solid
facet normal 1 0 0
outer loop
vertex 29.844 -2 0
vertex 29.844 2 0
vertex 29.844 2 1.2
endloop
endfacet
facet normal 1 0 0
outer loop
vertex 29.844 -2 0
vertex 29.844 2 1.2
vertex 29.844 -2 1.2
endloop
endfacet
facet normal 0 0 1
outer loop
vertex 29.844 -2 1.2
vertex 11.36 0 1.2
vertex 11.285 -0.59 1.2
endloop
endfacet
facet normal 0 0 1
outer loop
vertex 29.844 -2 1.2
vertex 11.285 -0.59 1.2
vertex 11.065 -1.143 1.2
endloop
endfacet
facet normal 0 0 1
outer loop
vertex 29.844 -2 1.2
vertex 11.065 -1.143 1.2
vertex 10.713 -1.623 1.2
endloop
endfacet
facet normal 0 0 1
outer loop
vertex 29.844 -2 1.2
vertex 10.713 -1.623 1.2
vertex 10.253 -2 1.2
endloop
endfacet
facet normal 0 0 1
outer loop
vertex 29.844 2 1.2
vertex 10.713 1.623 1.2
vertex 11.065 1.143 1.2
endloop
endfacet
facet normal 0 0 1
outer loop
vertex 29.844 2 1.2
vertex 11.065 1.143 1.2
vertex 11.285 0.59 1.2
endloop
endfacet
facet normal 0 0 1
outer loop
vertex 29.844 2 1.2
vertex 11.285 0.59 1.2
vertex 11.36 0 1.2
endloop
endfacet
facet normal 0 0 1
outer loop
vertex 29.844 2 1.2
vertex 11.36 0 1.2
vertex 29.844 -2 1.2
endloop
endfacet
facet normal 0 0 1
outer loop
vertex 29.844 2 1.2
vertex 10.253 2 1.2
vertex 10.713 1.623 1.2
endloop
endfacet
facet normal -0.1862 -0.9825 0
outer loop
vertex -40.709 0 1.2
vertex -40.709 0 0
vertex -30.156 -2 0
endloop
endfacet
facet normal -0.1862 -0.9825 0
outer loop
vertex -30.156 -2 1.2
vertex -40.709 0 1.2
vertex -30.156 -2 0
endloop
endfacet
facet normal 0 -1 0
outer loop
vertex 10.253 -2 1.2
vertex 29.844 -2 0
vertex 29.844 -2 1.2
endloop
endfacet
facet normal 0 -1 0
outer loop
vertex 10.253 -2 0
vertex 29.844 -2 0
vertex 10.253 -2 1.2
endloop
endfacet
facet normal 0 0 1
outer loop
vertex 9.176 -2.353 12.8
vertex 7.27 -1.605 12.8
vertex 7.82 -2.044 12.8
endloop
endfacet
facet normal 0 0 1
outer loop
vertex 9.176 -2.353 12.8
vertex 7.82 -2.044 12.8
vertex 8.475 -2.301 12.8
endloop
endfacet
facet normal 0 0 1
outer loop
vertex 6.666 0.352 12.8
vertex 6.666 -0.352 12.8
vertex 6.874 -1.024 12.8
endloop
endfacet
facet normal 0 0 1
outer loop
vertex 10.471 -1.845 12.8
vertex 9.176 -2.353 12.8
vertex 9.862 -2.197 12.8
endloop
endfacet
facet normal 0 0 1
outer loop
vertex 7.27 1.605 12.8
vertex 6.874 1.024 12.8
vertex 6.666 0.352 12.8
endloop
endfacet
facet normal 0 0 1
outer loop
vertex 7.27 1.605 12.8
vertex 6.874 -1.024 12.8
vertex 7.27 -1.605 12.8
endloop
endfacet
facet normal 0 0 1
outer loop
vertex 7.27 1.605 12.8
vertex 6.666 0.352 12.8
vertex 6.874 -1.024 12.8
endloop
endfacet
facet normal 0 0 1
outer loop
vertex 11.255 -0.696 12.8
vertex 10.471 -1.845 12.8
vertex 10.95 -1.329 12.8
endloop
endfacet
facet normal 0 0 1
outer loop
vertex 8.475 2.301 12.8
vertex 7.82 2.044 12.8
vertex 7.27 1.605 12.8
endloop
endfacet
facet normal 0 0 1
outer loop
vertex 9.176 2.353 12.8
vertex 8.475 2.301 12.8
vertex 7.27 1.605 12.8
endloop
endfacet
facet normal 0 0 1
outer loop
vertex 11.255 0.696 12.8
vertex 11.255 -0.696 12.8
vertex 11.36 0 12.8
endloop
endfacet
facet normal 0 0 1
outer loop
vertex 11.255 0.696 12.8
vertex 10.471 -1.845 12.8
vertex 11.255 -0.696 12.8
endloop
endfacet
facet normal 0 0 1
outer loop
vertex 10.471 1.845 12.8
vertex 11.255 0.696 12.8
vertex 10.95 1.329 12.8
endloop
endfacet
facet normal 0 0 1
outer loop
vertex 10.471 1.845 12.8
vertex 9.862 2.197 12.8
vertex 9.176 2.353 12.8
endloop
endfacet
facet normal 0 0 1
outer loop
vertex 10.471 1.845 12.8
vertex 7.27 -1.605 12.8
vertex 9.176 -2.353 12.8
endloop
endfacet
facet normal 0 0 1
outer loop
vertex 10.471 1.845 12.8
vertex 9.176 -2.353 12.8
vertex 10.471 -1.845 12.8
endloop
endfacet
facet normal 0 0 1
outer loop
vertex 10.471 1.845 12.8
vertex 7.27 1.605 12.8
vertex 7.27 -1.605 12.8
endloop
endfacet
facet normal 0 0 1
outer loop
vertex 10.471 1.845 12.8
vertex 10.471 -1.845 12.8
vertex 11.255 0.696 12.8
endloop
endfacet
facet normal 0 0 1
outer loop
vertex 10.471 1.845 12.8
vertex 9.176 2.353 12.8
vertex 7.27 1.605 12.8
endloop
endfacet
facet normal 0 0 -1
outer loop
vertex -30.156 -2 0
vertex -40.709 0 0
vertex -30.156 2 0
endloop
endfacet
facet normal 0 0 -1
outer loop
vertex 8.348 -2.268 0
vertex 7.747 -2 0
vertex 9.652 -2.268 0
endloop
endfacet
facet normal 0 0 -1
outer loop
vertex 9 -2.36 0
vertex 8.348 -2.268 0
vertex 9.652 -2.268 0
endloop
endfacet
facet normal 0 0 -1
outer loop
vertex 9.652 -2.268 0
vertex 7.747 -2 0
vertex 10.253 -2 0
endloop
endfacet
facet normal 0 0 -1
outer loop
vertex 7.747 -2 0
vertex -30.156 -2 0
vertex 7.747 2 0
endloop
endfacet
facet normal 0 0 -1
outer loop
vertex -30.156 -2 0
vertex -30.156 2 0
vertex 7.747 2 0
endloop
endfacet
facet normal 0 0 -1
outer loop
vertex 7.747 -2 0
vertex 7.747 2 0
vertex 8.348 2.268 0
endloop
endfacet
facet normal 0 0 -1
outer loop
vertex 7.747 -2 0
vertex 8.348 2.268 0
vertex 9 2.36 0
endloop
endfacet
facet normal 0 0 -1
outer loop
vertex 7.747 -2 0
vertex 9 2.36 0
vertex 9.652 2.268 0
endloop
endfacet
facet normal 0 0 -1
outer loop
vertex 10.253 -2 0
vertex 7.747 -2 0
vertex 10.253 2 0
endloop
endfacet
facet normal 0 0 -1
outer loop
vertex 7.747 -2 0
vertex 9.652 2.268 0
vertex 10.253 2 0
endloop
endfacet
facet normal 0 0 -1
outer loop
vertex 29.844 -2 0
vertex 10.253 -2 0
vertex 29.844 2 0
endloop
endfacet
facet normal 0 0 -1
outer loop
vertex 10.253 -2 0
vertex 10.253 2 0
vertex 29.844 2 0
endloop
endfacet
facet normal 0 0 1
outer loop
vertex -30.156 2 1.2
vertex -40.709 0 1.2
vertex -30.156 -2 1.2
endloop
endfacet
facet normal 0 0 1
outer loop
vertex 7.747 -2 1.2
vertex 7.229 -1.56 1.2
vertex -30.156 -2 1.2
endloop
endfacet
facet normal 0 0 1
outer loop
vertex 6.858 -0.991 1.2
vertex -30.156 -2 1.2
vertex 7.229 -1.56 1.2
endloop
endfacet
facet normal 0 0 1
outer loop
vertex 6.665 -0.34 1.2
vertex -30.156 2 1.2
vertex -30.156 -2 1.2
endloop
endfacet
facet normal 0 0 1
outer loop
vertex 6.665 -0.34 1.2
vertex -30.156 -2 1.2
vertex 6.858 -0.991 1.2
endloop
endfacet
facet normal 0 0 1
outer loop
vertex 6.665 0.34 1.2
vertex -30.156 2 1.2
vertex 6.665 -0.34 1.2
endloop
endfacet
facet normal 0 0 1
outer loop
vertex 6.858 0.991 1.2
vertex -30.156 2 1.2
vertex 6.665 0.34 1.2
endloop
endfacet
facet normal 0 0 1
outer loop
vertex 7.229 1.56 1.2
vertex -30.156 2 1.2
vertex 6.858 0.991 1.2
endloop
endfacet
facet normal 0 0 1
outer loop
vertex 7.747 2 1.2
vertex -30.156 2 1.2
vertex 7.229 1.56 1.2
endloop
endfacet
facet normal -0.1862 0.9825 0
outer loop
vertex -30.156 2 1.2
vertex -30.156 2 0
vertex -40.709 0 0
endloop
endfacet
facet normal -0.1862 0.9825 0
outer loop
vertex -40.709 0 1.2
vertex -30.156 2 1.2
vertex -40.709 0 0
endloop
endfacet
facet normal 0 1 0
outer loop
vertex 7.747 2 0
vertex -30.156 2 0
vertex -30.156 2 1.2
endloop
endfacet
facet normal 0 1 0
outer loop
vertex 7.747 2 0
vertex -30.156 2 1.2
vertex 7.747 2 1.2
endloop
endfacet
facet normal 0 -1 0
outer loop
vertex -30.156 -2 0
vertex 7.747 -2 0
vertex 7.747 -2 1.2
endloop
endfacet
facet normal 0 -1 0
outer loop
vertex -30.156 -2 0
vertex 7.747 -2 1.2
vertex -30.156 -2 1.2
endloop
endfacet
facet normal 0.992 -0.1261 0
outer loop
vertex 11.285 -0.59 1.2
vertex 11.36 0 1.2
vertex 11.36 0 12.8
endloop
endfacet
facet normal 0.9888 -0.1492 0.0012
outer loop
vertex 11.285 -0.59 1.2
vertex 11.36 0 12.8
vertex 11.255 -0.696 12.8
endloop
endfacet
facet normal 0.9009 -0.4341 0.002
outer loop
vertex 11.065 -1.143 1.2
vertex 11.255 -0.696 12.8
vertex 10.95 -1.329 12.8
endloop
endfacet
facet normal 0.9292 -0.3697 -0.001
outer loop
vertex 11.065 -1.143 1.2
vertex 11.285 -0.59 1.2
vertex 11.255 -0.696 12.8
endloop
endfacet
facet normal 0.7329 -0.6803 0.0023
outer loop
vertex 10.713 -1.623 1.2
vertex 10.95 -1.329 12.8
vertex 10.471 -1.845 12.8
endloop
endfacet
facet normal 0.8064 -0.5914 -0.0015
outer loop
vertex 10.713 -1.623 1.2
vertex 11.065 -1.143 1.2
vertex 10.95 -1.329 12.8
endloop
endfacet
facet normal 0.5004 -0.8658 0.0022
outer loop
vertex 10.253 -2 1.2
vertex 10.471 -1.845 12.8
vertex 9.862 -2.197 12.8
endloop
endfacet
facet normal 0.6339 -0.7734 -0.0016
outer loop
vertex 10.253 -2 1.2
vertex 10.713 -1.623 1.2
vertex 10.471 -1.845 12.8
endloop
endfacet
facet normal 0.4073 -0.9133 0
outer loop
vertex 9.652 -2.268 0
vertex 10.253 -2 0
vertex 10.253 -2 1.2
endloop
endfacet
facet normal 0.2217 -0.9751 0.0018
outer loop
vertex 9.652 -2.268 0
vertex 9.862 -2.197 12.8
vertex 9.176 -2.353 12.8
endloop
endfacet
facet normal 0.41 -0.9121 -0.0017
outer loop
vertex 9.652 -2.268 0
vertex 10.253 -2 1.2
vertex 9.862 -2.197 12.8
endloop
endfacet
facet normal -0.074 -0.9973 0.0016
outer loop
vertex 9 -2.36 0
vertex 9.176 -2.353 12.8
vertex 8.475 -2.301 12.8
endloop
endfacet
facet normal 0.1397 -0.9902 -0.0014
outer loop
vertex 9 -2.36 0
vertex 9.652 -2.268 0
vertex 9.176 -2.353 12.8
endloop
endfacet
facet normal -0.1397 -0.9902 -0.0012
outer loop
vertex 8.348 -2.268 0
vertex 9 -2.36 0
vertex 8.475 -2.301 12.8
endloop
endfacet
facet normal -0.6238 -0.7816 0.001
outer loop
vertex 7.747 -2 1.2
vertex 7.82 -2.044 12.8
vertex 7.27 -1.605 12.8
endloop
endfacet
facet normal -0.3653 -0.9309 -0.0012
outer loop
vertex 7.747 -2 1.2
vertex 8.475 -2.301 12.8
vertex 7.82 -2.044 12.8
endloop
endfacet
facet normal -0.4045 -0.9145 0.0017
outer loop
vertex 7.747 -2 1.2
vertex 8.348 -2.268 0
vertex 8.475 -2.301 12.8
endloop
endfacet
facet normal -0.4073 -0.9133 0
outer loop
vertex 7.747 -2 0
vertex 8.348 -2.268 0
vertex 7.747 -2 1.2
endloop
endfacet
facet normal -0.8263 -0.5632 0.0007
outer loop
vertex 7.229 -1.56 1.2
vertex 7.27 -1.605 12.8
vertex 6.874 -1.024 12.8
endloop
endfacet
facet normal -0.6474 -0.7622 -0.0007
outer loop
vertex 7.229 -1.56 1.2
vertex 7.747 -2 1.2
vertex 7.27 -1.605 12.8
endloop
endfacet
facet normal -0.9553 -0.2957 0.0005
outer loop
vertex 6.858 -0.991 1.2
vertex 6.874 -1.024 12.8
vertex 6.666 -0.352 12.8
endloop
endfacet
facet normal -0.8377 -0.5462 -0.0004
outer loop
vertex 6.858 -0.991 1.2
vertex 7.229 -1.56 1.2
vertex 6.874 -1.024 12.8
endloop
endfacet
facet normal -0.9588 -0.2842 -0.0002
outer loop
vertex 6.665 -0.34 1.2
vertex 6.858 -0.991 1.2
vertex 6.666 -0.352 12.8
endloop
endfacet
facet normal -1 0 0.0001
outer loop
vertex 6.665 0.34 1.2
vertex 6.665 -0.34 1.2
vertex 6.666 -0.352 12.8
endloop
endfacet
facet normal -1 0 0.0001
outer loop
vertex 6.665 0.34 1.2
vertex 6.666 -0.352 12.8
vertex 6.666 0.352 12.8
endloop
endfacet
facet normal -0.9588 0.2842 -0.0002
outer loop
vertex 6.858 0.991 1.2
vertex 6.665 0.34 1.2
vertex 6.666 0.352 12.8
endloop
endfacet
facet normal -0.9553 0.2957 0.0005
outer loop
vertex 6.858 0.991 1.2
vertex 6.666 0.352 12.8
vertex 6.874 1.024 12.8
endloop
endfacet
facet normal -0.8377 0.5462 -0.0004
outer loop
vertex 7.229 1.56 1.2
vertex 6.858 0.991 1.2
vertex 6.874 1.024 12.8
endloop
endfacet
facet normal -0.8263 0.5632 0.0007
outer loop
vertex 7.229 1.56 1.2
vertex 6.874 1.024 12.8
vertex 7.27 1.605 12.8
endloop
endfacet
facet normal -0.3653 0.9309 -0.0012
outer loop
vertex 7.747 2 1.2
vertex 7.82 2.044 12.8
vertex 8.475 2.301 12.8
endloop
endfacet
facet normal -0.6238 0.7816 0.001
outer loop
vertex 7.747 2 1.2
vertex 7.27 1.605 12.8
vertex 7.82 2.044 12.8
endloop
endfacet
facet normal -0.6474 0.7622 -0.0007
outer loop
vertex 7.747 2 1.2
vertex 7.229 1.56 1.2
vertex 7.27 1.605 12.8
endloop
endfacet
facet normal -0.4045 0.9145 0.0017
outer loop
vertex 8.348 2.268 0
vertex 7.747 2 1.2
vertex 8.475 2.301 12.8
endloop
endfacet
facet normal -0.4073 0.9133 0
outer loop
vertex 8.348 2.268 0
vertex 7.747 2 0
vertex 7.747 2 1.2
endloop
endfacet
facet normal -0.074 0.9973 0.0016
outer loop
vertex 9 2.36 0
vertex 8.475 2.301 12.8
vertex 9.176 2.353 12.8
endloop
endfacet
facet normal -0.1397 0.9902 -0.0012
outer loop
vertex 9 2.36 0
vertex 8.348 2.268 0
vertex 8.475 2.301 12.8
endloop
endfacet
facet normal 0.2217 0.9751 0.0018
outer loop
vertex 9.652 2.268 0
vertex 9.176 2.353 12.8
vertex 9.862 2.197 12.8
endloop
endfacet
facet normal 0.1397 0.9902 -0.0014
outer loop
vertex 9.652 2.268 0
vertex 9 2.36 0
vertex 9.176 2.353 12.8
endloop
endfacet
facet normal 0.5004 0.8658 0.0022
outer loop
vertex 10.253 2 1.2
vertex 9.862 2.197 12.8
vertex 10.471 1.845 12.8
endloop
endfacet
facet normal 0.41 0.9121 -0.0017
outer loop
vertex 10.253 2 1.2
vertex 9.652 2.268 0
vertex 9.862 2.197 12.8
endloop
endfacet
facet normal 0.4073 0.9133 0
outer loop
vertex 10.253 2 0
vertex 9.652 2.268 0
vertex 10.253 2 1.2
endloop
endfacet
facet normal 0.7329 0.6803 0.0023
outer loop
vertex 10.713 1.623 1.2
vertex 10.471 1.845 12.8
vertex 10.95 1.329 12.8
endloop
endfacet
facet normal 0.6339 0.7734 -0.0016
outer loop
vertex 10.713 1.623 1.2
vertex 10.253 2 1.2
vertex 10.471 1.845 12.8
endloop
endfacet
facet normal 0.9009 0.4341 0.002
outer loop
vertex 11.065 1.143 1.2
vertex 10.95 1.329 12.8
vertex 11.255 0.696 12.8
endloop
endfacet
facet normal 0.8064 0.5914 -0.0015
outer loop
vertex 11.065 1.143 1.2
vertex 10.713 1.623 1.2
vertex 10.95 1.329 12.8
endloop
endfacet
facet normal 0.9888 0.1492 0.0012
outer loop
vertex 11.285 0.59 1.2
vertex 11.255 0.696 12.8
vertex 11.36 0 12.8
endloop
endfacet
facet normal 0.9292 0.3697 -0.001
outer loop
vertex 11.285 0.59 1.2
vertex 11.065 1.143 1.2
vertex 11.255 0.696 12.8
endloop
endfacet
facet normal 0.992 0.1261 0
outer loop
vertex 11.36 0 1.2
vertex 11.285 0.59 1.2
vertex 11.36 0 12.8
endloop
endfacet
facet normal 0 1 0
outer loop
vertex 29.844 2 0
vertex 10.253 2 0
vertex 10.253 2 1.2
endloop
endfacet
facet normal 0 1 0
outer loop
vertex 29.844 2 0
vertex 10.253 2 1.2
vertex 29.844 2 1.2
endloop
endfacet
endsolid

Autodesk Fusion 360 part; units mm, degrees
sketch "草图1" plane through (0, 0, 0) normal (0, 0, 1) x (1, 0, 0)
  line L0 (29.8435, -2) -> (-30.1565, -2)
  line L1 (-30.1565, -2) -> (-30.1565, 2)
  line L2 (-30.1565, 2) -> (29.8435, 2)
  line L3 (29.8435, 2) -> (29.8435, -2)
  line L4 (-30.1565, 2) -> (-40.7091, 0)
  line L5 (-40.7091, 0) -> (-30.1565, -2)
  point P0 (-0.1565, 0)
  dimension "d1" = 60
  dimension "d2" = 4
extrude "拉伸1" add sketch "草图1" along normal blind 1.2
sketch "草图2" plane through (0, 0, 0) normal (0, 0, 1) x (1, 0, 0)
  circle A0 centre (9, 0) radius 2.36
  dimension "d5" = 4.72
extrude "拉伸2" add sketch "草图2" along normal blind 12.8
